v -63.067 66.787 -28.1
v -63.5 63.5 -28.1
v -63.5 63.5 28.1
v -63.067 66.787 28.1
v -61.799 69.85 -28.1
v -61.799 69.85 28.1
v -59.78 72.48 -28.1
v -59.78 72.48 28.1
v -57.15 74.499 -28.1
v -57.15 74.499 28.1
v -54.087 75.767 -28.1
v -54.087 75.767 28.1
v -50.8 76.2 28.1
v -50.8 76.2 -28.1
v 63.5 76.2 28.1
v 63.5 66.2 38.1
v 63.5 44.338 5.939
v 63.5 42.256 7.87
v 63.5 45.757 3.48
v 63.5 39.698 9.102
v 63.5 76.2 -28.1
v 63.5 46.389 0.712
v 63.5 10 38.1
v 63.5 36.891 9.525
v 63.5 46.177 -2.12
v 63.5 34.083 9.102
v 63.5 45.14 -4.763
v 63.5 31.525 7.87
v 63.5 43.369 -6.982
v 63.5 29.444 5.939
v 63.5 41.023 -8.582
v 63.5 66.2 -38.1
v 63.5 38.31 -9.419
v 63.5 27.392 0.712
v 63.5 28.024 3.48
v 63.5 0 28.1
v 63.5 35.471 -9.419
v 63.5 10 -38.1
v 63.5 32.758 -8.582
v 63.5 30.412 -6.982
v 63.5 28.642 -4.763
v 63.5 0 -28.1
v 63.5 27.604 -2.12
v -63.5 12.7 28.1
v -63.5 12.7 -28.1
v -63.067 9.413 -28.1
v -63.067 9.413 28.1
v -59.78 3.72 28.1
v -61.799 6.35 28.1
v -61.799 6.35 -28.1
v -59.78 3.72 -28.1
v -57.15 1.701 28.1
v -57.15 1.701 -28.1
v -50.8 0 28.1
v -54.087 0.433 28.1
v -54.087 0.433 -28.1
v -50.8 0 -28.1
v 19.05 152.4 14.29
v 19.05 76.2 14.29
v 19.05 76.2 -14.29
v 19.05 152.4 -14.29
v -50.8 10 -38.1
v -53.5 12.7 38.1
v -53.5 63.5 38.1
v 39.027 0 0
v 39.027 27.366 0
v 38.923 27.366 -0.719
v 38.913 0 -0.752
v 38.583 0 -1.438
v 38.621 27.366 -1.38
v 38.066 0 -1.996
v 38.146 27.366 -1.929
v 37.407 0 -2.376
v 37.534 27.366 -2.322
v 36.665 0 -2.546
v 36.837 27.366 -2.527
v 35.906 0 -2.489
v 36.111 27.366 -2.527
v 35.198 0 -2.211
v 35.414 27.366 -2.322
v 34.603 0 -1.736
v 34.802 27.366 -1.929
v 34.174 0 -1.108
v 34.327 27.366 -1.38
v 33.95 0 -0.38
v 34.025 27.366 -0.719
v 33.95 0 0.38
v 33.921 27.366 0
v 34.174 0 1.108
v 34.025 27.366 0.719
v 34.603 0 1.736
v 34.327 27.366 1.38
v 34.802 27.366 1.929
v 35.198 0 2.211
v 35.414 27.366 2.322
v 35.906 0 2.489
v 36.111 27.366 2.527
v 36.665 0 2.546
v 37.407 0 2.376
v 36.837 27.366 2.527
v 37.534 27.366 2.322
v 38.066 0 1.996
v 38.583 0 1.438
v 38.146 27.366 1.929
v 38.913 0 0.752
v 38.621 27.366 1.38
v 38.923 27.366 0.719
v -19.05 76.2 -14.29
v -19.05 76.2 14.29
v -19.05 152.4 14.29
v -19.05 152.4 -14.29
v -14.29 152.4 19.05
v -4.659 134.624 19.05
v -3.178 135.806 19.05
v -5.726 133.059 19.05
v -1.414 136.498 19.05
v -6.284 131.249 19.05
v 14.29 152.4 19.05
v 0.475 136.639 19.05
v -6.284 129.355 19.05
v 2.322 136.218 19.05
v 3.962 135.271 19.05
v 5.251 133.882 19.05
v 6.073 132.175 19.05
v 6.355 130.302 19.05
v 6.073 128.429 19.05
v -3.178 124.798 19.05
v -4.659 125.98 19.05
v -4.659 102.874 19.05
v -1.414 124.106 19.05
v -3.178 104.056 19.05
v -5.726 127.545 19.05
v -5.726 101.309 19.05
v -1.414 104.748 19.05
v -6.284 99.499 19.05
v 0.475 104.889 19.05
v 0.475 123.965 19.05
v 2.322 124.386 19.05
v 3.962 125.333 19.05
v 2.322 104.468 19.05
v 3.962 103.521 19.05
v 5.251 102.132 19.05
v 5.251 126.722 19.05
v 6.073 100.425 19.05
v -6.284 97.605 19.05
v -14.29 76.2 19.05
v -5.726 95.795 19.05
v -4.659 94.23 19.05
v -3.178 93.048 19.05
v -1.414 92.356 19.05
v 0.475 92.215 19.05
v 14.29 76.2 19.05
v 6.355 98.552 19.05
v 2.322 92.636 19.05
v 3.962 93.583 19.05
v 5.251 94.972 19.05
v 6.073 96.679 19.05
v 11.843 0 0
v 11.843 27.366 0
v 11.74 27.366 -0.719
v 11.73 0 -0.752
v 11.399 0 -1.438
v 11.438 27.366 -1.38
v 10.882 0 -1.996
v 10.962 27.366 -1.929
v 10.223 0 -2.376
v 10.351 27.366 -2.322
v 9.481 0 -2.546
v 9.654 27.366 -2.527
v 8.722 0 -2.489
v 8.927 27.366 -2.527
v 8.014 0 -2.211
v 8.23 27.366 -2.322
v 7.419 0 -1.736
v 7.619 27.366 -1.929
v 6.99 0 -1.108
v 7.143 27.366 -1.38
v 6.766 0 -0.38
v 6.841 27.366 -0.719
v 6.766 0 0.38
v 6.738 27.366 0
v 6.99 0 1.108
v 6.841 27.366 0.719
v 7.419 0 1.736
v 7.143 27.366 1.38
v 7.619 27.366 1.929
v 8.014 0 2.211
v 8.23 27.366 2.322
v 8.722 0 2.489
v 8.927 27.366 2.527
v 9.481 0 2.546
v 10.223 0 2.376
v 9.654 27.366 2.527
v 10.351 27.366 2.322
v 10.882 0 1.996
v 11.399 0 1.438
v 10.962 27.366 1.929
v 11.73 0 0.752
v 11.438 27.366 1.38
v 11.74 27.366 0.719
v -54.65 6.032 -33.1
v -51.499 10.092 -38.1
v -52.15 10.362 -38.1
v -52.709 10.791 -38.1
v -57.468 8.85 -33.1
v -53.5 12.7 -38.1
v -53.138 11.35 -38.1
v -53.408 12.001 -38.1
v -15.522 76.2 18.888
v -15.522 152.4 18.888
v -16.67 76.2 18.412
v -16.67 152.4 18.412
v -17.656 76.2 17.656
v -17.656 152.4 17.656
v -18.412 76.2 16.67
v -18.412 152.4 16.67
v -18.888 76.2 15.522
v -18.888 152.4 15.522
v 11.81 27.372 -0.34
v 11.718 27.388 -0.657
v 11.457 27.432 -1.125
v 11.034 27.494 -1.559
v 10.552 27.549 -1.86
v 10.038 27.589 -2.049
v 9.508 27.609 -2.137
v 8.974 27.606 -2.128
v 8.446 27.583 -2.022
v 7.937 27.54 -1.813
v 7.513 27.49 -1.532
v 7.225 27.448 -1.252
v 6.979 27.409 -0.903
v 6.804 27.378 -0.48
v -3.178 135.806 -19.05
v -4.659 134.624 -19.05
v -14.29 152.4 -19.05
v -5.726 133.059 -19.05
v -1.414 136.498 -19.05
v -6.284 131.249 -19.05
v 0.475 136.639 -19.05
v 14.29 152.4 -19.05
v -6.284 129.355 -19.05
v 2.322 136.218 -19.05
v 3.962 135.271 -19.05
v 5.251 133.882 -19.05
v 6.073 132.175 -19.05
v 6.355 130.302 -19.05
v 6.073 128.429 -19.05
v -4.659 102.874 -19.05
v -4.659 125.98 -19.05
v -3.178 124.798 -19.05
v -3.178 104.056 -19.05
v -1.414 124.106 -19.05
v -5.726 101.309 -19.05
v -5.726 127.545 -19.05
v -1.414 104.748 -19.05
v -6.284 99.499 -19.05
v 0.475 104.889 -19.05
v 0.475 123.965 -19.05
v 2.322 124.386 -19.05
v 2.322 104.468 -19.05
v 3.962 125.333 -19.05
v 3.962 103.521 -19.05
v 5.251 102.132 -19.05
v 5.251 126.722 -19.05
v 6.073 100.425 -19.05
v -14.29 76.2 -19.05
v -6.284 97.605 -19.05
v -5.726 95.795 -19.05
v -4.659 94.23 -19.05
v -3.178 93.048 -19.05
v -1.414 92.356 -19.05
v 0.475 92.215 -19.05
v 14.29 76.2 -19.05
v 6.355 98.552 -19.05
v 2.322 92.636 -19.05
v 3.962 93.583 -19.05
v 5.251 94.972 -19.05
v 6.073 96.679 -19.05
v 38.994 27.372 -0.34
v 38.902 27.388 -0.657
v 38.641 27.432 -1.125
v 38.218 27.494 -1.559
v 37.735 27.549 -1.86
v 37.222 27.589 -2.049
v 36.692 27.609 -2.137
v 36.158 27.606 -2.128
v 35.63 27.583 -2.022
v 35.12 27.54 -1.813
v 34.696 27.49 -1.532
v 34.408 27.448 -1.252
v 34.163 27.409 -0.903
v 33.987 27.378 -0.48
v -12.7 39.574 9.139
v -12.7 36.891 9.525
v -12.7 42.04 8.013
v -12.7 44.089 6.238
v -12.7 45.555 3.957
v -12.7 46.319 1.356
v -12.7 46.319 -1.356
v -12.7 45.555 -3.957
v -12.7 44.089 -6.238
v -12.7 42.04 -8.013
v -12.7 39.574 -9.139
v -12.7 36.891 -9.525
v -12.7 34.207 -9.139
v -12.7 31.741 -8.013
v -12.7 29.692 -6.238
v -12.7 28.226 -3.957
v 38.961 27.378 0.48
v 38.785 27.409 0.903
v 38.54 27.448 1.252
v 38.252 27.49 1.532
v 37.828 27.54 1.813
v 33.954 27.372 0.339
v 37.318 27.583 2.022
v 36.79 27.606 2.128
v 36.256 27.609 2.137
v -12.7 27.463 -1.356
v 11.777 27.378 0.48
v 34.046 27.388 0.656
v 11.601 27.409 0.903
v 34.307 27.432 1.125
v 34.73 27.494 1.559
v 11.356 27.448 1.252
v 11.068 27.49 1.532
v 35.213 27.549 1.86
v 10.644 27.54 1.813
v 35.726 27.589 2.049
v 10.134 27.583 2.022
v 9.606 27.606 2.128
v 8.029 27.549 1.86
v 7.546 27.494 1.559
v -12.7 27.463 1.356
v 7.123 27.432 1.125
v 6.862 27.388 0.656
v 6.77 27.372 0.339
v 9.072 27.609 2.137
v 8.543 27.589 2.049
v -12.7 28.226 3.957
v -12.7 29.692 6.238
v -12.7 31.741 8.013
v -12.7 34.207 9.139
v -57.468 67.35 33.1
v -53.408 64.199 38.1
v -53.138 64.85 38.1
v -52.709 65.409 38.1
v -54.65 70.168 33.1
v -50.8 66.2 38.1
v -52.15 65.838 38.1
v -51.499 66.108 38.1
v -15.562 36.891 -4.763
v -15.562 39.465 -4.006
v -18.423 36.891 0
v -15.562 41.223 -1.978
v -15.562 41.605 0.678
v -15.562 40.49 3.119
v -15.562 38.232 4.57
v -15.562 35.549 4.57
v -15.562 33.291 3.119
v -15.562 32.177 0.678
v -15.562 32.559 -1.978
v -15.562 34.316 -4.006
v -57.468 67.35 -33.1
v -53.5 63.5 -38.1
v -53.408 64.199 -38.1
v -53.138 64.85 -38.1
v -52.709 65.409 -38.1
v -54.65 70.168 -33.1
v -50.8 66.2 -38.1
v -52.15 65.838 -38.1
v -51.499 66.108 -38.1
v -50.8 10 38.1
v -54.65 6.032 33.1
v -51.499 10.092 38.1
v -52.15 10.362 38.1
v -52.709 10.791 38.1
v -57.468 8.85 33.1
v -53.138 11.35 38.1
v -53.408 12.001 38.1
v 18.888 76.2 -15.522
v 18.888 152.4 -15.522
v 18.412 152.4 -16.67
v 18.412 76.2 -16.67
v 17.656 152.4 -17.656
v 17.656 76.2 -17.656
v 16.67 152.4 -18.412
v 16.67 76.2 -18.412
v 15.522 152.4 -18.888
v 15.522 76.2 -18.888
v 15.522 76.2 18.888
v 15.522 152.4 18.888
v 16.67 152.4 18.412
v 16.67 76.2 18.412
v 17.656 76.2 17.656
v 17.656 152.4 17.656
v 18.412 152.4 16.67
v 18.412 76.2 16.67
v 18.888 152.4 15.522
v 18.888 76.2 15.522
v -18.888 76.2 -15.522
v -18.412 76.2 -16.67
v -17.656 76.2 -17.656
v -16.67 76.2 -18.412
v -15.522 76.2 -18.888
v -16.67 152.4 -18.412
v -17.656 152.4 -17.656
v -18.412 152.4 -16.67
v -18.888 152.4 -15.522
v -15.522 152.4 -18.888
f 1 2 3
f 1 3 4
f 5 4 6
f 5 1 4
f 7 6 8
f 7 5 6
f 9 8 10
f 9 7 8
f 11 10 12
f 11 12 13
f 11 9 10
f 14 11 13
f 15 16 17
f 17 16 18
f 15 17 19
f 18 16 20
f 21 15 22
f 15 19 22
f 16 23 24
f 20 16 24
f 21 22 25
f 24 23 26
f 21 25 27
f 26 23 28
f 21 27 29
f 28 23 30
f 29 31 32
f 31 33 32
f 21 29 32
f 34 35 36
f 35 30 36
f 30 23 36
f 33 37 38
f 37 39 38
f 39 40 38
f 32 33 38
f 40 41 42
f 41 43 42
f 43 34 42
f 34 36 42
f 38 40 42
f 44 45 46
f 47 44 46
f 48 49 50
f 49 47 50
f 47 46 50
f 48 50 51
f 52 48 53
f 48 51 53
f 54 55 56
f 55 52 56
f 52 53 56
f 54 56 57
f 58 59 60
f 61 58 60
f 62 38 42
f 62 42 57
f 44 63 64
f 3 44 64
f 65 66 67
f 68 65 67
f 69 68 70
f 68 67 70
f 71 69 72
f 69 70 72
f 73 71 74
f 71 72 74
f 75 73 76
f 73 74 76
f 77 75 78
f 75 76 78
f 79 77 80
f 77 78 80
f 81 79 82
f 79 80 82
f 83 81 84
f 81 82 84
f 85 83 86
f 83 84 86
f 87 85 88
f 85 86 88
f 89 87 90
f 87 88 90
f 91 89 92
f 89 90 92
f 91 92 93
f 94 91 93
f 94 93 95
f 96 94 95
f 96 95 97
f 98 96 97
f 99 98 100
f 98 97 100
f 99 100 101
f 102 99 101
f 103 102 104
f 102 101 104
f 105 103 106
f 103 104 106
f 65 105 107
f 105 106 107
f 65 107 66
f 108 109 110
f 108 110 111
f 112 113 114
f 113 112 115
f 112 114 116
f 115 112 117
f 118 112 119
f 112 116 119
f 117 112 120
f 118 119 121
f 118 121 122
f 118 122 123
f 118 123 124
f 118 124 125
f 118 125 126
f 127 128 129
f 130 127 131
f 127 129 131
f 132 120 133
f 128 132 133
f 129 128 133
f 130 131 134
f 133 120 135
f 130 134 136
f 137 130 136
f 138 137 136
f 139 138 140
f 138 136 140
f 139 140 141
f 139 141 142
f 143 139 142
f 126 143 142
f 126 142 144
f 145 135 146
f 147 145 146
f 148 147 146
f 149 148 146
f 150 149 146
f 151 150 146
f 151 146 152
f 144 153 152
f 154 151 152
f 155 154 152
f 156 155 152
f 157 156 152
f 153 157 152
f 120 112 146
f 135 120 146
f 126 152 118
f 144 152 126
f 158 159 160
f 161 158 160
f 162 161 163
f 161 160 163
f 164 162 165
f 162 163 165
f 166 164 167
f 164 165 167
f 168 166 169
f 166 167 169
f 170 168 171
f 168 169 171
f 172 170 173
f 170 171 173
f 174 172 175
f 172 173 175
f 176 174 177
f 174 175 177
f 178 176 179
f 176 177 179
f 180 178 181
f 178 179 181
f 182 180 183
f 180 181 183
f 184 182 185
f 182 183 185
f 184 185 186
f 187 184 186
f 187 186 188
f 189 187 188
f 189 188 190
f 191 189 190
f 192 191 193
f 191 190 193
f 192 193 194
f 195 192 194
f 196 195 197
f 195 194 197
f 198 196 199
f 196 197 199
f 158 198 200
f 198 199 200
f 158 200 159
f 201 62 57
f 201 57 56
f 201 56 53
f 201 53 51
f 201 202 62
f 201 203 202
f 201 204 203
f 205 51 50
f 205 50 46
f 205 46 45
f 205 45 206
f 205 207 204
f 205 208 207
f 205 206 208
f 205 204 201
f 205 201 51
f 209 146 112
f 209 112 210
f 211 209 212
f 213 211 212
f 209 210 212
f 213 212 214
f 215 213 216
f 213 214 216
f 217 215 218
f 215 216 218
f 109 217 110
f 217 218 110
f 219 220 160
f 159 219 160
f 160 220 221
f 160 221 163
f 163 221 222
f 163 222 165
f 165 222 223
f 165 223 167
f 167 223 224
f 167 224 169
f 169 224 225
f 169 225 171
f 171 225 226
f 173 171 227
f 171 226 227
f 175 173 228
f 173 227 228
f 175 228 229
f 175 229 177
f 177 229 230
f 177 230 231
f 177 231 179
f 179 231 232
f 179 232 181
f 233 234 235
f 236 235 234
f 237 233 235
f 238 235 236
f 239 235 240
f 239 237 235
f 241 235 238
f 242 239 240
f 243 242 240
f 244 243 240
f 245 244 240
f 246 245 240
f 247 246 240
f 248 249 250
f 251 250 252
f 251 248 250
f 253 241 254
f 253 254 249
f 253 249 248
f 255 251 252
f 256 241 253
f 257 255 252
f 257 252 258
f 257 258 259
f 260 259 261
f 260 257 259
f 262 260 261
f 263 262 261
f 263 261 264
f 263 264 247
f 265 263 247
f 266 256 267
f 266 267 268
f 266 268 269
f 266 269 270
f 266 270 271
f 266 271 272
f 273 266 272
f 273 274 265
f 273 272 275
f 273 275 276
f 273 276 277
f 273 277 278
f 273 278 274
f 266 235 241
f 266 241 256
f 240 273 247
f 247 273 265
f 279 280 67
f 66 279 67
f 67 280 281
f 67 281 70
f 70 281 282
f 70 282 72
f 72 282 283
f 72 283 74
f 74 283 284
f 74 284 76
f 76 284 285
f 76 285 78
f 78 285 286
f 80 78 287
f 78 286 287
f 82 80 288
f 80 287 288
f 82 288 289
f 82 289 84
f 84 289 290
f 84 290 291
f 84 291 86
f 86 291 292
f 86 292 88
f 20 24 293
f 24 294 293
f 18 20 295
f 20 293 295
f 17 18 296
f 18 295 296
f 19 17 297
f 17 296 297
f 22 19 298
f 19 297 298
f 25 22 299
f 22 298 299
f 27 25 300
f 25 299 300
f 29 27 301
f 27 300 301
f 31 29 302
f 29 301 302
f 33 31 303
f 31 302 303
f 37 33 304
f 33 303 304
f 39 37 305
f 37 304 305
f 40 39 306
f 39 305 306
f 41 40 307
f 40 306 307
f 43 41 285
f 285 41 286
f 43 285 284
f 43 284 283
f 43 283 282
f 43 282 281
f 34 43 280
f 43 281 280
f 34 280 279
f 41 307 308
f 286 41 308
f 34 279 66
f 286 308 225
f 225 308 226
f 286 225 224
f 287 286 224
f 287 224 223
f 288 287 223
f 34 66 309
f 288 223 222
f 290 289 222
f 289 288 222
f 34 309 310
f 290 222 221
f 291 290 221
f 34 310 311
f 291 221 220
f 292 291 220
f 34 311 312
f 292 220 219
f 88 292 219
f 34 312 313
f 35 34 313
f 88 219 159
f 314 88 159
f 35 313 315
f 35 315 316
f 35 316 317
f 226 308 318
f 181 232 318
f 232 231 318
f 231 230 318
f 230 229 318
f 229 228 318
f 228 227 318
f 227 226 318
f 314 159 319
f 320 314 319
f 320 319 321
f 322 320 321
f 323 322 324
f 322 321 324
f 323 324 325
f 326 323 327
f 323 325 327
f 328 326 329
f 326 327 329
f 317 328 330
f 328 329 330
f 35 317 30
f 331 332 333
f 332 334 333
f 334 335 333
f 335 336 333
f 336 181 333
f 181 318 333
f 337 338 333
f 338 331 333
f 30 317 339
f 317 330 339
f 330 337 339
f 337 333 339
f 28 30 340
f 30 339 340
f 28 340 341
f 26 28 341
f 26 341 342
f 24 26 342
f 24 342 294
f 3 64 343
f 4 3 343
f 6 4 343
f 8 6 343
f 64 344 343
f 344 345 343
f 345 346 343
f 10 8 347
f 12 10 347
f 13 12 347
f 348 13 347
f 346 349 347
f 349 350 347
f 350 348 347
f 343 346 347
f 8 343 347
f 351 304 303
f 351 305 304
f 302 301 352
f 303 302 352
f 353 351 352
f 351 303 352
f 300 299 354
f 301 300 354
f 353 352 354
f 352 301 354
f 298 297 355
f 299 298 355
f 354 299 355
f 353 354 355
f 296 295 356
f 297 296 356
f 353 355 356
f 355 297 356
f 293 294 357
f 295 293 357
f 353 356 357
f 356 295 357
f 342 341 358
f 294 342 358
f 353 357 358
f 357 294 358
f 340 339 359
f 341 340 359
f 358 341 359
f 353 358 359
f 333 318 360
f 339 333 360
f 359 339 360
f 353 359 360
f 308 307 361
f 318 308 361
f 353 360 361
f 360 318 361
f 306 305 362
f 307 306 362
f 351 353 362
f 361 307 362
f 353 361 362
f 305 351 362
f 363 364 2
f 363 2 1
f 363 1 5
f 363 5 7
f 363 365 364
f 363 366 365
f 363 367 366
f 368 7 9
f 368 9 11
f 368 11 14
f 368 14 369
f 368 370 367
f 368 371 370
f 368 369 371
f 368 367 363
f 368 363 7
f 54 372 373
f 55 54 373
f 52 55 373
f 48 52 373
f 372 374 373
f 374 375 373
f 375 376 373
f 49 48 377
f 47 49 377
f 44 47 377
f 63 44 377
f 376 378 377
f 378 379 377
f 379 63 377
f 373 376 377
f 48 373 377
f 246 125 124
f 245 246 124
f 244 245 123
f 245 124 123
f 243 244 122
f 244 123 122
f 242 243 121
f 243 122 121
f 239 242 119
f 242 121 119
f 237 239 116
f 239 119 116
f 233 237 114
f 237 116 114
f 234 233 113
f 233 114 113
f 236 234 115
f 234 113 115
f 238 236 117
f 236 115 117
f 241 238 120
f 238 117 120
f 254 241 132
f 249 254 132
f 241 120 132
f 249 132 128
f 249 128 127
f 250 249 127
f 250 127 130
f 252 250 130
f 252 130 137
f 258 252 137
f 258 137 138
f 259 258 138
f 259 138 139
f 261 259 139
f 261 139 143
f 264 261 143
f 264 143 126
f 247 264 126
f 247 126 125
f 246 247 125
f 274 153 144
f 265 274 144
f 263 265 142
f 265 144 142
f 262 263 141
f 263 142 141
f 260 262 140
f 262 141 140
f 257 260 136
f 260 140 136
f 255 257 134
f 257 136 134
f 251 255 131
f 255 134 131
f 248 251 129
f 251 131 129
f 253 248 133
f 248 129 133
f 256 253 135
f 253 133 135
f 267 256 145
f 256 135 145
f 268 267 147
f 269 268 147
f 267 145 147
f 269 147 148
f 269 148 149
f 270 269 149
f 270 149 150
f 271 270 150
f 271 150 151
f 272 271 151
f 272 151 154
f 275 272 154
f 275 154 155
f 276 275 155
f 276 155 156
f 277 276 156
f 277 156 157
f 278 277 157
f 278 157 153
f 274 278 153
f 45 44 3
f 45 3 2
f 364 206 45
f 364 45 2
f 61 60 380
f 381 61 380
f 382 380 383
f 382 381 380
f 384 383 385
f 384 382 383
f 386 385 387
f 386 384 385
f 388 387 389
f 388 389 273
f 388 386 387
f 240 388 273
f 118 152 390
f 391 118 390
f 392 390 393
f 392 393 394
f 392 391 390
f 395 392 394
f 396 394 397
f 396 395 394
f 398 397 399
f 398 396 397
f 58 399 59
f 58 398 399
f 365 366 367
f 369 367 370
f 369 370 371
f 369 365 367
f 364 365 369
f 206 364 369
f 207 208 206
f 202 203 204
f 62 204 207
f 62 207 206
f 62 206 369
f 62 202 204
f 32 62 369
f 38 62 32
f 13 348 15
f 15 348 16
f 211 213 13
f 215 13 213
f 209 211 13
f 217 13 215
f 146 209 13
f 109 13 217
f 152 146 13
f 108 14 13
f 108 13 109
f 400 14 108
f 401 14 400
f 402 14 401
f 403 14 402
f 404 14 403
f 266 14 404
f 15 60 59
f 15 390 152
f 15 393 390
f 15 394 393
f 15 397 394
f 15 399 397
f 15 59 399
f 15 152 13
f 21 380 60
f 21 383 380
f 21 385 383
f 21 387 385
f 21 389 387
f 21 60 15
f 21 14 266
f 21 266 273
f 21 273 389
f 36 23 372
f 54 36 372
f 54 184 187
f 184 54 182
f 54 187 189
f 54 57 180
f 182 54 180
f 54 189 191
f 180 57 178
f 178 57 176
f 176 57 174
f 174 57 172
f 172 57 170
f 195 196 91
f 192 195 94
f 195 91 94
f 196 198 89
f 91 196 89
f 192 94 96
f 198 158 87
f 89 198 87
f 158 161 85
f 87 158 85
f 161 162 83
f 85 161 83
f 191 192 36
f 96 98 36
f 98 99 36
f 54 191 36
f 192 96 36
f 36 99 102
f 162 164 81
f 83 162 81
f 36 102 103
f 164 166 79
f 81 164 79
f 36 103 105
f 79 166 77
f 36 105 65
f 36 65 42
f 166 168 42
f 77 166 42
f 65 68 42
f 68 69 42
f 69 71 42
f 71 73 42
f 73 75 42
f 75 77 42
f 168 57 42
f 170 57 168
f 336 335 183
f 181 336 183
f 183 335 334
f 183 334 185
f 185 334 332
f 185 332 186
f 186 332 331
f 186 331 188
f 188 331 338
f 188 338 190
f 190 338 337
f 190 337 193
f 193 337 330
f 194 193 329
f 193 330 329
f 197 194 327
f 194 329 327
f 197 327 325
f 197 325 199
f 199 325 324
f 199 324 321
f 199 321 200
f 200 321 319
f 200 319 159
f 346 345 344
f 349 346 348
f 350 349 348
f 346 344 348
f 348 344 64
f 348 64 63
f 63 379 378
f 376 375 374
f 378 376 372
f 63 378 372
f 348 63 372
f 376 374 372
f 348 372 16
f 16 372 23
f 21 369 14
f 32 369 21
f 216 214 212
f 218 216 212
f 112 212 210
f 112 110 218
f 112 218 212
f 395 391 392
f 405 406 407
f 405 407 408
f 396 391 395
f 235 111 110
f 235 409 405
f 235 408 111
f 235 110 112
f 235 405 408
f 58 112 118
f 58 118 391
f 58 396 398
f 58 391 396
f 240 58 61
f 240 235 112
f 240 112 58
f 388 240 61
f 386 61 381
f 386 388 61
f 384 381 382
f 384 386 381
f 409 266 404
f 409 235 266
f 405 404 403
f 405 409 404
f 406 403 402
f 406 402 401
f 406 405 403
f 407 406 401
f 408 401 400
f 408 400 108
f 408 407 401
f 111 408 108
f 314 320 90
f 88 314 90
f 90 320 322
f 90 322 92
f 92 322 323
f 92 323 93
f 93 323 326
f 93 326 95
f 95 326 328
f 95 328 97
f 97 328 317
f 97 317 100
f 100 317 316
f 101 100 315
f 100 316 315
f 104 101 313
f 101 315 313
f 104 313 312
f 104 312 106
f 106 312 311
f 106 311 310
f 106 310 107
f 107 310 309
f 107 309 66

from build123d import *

# Parameters (mm, degrees)
SKETCH2_W                      = 127
SKETCH2_H                      = 76.2
BOSS_EXTRUDE2_DEPTH            = 76.2
FILLET1_R                      = 12.7
CHAMFER1_SIZE                  = 10
F_3_4_0_7500_DOWEL_HOLE1_D     = 19.05
F_3_4_0_7500_DOWEL_HOLE1_DEPTH = 76.2
F_3_4_0_7500_DOWEL_HOLE1_TIP   = 5.723197396
SKETCH9_W                      = 38.1
SKETCH9_H                      = 38.1
BOSS_EXTRUDE3_DEPTH            = 76.2
SKETCH10_R                     = 6.355
CUT_EXTRUDE1_DEPTH             = 175.711569487
FILLET3_R                      = 4.76


# Read off the part's stored shape, not the designer's step: 1/4-20 Tapped Hole1
with BuildPart() as part:
    # Sketch2 → Boss-Extrude2 (new body)
    with BuildSketch(Plane(origin=(0, 0, 0), x_dir=(1, 0, 0), z_dir=(0, 1, 0))):
        Rectangle(SKETCH2_W, SKETCH2_H)
    extrude(amount=BOSS_EXTRUDE2_DEPTH)

    # Fillet1
    fillet1_edges = [part.edges().sort_by_distance(p)[0] for p in [
        (-63.5, 76.2, 0),
        (-63.5, 0, 0),
    ]]
    fillet(fillet1_edges, radius=FILLET1_R)

    # Chamfer1
    chamfer1_edges = [part.edges().sort_by_distance(p)[0] for p in [
        (-63.5, 38.1, 38.1),
        (-63.5, 38.1, -38.1),
        (6.35, 0, 38.1),
        (6.35, 76.2, 38.1),
        (-59.780256121, 72.480256121, 38.1),
        (-59.780256121, 3.719743879, 38.1),
        (-59.780256121, 72.480256121, -38.1),
        (-59.780256121, 3.719743879, -38.1),
        (6.35, 0, -38.1),
        (6.35, 76.2, -38.1),
    ]]
    chamfer(chamfer1_edges, length=CHAMFER1_SIZE)

    # 3/4 (0.7500) Dowel Hole1
    with Locations(Plane(origin=(63.5, 0, 0), x_dir=(0, 0, -1), z_dir=(1, 0, 0))):
        with Locations((0, 36.890636669)):
            Hole(F_3_4_0_7500_DOWEL_HOLE1_D / 2, depth=F_3_4_0_7500_DOWEL_HOLE1_DEPTH)
            with Locations((0, 0, -(F_3_4_0_7500_DOWEL_HOLE1_DEPTH + F_3_4_0_7500_DOWEL_HOLE1_TIP / 2))):  # 118° drill point
                Cone(0, F_3_4_0_7500_DOWEL_HOLE1_D / 2, F_3_4_0_7500_DOWEL_HOLE1_TIP, mode=Mode.SUBTRACT)

    # 1/4-20 Tapped Hole1 outline → 1/4-20 Tapped Hole1 (revolve, cut)
    with BuildSketch(Plane(origin=(9.290251981, 0, 0), x_dir=(1, 0, 0), z_dir=(0, 0, 1))):
        Polygon((2.5527, 0), (2.5527, 27.365636669), (2.145213678, 27.610479152), (0, 27.610479152), (0, 0), align=None)
    revolve(axis=Axis((9.290251981, 0, 0), (0, 1, 0)), mode=Mode.SUBTRACT)

    # 1_4-20 Tapped Hole1 2 outline → 1_4-20 Tapped Hole1 2 (revolve, cut)
    with BuildSketch(Plane(origin=(36.474004082, 0, 0), x_dir=(1, 0, 0), z_dir=(0, 0, 1))):
        Polygon((2.5527, 0), (2.5527, 27.365636669), (2.145213678, 27.610479152), (0, 27.610479152), (0, 0), align=None)
    revolve(axis=Axis((36.474004082, 0, 0), (0, 1, 0)), mode=Mode.SUBTRACT)

    # Sketch9 → Boss-Extrude3 (add)
    with BuildSketch(Plane(origin=(0, 76.2, 0), x_dir=(1, 0, 0), z_dir=(0, 1, 0))):
        Rectangle(SKETCH9_W, SKETCH9_H)
    extrude(amount=BOSS_EXTRUDE3_DEPTH)

    # Sketch10 → Cut-Extrude1 (cut, through all)
    with BuildSketch(Plane.XY.offset(19.05)):
        with Locations((0, 98.552)):
            Circle(SKETCH10_R)
        with Locations((0, 130.302)):
            Circle(SKETCH10_R)
    extrude(amount=-CUT_EXTRUDE1_DEPTH, mode=Mode.SUBTRACT)

    # Fillet3
    fillet3_edges = [part.edges().sort_by_distance(p)[0] for p in [
        (19.05, 114.3, 19.05),
        (19.05, 114.3, -19.05),
        (-19.05, 114.3, -19.05),
        (-19.05, 114.3, 19.05),
    ]]
    fillet(fillet3_edges, radius=FILLET3_R)


solid = part.part
